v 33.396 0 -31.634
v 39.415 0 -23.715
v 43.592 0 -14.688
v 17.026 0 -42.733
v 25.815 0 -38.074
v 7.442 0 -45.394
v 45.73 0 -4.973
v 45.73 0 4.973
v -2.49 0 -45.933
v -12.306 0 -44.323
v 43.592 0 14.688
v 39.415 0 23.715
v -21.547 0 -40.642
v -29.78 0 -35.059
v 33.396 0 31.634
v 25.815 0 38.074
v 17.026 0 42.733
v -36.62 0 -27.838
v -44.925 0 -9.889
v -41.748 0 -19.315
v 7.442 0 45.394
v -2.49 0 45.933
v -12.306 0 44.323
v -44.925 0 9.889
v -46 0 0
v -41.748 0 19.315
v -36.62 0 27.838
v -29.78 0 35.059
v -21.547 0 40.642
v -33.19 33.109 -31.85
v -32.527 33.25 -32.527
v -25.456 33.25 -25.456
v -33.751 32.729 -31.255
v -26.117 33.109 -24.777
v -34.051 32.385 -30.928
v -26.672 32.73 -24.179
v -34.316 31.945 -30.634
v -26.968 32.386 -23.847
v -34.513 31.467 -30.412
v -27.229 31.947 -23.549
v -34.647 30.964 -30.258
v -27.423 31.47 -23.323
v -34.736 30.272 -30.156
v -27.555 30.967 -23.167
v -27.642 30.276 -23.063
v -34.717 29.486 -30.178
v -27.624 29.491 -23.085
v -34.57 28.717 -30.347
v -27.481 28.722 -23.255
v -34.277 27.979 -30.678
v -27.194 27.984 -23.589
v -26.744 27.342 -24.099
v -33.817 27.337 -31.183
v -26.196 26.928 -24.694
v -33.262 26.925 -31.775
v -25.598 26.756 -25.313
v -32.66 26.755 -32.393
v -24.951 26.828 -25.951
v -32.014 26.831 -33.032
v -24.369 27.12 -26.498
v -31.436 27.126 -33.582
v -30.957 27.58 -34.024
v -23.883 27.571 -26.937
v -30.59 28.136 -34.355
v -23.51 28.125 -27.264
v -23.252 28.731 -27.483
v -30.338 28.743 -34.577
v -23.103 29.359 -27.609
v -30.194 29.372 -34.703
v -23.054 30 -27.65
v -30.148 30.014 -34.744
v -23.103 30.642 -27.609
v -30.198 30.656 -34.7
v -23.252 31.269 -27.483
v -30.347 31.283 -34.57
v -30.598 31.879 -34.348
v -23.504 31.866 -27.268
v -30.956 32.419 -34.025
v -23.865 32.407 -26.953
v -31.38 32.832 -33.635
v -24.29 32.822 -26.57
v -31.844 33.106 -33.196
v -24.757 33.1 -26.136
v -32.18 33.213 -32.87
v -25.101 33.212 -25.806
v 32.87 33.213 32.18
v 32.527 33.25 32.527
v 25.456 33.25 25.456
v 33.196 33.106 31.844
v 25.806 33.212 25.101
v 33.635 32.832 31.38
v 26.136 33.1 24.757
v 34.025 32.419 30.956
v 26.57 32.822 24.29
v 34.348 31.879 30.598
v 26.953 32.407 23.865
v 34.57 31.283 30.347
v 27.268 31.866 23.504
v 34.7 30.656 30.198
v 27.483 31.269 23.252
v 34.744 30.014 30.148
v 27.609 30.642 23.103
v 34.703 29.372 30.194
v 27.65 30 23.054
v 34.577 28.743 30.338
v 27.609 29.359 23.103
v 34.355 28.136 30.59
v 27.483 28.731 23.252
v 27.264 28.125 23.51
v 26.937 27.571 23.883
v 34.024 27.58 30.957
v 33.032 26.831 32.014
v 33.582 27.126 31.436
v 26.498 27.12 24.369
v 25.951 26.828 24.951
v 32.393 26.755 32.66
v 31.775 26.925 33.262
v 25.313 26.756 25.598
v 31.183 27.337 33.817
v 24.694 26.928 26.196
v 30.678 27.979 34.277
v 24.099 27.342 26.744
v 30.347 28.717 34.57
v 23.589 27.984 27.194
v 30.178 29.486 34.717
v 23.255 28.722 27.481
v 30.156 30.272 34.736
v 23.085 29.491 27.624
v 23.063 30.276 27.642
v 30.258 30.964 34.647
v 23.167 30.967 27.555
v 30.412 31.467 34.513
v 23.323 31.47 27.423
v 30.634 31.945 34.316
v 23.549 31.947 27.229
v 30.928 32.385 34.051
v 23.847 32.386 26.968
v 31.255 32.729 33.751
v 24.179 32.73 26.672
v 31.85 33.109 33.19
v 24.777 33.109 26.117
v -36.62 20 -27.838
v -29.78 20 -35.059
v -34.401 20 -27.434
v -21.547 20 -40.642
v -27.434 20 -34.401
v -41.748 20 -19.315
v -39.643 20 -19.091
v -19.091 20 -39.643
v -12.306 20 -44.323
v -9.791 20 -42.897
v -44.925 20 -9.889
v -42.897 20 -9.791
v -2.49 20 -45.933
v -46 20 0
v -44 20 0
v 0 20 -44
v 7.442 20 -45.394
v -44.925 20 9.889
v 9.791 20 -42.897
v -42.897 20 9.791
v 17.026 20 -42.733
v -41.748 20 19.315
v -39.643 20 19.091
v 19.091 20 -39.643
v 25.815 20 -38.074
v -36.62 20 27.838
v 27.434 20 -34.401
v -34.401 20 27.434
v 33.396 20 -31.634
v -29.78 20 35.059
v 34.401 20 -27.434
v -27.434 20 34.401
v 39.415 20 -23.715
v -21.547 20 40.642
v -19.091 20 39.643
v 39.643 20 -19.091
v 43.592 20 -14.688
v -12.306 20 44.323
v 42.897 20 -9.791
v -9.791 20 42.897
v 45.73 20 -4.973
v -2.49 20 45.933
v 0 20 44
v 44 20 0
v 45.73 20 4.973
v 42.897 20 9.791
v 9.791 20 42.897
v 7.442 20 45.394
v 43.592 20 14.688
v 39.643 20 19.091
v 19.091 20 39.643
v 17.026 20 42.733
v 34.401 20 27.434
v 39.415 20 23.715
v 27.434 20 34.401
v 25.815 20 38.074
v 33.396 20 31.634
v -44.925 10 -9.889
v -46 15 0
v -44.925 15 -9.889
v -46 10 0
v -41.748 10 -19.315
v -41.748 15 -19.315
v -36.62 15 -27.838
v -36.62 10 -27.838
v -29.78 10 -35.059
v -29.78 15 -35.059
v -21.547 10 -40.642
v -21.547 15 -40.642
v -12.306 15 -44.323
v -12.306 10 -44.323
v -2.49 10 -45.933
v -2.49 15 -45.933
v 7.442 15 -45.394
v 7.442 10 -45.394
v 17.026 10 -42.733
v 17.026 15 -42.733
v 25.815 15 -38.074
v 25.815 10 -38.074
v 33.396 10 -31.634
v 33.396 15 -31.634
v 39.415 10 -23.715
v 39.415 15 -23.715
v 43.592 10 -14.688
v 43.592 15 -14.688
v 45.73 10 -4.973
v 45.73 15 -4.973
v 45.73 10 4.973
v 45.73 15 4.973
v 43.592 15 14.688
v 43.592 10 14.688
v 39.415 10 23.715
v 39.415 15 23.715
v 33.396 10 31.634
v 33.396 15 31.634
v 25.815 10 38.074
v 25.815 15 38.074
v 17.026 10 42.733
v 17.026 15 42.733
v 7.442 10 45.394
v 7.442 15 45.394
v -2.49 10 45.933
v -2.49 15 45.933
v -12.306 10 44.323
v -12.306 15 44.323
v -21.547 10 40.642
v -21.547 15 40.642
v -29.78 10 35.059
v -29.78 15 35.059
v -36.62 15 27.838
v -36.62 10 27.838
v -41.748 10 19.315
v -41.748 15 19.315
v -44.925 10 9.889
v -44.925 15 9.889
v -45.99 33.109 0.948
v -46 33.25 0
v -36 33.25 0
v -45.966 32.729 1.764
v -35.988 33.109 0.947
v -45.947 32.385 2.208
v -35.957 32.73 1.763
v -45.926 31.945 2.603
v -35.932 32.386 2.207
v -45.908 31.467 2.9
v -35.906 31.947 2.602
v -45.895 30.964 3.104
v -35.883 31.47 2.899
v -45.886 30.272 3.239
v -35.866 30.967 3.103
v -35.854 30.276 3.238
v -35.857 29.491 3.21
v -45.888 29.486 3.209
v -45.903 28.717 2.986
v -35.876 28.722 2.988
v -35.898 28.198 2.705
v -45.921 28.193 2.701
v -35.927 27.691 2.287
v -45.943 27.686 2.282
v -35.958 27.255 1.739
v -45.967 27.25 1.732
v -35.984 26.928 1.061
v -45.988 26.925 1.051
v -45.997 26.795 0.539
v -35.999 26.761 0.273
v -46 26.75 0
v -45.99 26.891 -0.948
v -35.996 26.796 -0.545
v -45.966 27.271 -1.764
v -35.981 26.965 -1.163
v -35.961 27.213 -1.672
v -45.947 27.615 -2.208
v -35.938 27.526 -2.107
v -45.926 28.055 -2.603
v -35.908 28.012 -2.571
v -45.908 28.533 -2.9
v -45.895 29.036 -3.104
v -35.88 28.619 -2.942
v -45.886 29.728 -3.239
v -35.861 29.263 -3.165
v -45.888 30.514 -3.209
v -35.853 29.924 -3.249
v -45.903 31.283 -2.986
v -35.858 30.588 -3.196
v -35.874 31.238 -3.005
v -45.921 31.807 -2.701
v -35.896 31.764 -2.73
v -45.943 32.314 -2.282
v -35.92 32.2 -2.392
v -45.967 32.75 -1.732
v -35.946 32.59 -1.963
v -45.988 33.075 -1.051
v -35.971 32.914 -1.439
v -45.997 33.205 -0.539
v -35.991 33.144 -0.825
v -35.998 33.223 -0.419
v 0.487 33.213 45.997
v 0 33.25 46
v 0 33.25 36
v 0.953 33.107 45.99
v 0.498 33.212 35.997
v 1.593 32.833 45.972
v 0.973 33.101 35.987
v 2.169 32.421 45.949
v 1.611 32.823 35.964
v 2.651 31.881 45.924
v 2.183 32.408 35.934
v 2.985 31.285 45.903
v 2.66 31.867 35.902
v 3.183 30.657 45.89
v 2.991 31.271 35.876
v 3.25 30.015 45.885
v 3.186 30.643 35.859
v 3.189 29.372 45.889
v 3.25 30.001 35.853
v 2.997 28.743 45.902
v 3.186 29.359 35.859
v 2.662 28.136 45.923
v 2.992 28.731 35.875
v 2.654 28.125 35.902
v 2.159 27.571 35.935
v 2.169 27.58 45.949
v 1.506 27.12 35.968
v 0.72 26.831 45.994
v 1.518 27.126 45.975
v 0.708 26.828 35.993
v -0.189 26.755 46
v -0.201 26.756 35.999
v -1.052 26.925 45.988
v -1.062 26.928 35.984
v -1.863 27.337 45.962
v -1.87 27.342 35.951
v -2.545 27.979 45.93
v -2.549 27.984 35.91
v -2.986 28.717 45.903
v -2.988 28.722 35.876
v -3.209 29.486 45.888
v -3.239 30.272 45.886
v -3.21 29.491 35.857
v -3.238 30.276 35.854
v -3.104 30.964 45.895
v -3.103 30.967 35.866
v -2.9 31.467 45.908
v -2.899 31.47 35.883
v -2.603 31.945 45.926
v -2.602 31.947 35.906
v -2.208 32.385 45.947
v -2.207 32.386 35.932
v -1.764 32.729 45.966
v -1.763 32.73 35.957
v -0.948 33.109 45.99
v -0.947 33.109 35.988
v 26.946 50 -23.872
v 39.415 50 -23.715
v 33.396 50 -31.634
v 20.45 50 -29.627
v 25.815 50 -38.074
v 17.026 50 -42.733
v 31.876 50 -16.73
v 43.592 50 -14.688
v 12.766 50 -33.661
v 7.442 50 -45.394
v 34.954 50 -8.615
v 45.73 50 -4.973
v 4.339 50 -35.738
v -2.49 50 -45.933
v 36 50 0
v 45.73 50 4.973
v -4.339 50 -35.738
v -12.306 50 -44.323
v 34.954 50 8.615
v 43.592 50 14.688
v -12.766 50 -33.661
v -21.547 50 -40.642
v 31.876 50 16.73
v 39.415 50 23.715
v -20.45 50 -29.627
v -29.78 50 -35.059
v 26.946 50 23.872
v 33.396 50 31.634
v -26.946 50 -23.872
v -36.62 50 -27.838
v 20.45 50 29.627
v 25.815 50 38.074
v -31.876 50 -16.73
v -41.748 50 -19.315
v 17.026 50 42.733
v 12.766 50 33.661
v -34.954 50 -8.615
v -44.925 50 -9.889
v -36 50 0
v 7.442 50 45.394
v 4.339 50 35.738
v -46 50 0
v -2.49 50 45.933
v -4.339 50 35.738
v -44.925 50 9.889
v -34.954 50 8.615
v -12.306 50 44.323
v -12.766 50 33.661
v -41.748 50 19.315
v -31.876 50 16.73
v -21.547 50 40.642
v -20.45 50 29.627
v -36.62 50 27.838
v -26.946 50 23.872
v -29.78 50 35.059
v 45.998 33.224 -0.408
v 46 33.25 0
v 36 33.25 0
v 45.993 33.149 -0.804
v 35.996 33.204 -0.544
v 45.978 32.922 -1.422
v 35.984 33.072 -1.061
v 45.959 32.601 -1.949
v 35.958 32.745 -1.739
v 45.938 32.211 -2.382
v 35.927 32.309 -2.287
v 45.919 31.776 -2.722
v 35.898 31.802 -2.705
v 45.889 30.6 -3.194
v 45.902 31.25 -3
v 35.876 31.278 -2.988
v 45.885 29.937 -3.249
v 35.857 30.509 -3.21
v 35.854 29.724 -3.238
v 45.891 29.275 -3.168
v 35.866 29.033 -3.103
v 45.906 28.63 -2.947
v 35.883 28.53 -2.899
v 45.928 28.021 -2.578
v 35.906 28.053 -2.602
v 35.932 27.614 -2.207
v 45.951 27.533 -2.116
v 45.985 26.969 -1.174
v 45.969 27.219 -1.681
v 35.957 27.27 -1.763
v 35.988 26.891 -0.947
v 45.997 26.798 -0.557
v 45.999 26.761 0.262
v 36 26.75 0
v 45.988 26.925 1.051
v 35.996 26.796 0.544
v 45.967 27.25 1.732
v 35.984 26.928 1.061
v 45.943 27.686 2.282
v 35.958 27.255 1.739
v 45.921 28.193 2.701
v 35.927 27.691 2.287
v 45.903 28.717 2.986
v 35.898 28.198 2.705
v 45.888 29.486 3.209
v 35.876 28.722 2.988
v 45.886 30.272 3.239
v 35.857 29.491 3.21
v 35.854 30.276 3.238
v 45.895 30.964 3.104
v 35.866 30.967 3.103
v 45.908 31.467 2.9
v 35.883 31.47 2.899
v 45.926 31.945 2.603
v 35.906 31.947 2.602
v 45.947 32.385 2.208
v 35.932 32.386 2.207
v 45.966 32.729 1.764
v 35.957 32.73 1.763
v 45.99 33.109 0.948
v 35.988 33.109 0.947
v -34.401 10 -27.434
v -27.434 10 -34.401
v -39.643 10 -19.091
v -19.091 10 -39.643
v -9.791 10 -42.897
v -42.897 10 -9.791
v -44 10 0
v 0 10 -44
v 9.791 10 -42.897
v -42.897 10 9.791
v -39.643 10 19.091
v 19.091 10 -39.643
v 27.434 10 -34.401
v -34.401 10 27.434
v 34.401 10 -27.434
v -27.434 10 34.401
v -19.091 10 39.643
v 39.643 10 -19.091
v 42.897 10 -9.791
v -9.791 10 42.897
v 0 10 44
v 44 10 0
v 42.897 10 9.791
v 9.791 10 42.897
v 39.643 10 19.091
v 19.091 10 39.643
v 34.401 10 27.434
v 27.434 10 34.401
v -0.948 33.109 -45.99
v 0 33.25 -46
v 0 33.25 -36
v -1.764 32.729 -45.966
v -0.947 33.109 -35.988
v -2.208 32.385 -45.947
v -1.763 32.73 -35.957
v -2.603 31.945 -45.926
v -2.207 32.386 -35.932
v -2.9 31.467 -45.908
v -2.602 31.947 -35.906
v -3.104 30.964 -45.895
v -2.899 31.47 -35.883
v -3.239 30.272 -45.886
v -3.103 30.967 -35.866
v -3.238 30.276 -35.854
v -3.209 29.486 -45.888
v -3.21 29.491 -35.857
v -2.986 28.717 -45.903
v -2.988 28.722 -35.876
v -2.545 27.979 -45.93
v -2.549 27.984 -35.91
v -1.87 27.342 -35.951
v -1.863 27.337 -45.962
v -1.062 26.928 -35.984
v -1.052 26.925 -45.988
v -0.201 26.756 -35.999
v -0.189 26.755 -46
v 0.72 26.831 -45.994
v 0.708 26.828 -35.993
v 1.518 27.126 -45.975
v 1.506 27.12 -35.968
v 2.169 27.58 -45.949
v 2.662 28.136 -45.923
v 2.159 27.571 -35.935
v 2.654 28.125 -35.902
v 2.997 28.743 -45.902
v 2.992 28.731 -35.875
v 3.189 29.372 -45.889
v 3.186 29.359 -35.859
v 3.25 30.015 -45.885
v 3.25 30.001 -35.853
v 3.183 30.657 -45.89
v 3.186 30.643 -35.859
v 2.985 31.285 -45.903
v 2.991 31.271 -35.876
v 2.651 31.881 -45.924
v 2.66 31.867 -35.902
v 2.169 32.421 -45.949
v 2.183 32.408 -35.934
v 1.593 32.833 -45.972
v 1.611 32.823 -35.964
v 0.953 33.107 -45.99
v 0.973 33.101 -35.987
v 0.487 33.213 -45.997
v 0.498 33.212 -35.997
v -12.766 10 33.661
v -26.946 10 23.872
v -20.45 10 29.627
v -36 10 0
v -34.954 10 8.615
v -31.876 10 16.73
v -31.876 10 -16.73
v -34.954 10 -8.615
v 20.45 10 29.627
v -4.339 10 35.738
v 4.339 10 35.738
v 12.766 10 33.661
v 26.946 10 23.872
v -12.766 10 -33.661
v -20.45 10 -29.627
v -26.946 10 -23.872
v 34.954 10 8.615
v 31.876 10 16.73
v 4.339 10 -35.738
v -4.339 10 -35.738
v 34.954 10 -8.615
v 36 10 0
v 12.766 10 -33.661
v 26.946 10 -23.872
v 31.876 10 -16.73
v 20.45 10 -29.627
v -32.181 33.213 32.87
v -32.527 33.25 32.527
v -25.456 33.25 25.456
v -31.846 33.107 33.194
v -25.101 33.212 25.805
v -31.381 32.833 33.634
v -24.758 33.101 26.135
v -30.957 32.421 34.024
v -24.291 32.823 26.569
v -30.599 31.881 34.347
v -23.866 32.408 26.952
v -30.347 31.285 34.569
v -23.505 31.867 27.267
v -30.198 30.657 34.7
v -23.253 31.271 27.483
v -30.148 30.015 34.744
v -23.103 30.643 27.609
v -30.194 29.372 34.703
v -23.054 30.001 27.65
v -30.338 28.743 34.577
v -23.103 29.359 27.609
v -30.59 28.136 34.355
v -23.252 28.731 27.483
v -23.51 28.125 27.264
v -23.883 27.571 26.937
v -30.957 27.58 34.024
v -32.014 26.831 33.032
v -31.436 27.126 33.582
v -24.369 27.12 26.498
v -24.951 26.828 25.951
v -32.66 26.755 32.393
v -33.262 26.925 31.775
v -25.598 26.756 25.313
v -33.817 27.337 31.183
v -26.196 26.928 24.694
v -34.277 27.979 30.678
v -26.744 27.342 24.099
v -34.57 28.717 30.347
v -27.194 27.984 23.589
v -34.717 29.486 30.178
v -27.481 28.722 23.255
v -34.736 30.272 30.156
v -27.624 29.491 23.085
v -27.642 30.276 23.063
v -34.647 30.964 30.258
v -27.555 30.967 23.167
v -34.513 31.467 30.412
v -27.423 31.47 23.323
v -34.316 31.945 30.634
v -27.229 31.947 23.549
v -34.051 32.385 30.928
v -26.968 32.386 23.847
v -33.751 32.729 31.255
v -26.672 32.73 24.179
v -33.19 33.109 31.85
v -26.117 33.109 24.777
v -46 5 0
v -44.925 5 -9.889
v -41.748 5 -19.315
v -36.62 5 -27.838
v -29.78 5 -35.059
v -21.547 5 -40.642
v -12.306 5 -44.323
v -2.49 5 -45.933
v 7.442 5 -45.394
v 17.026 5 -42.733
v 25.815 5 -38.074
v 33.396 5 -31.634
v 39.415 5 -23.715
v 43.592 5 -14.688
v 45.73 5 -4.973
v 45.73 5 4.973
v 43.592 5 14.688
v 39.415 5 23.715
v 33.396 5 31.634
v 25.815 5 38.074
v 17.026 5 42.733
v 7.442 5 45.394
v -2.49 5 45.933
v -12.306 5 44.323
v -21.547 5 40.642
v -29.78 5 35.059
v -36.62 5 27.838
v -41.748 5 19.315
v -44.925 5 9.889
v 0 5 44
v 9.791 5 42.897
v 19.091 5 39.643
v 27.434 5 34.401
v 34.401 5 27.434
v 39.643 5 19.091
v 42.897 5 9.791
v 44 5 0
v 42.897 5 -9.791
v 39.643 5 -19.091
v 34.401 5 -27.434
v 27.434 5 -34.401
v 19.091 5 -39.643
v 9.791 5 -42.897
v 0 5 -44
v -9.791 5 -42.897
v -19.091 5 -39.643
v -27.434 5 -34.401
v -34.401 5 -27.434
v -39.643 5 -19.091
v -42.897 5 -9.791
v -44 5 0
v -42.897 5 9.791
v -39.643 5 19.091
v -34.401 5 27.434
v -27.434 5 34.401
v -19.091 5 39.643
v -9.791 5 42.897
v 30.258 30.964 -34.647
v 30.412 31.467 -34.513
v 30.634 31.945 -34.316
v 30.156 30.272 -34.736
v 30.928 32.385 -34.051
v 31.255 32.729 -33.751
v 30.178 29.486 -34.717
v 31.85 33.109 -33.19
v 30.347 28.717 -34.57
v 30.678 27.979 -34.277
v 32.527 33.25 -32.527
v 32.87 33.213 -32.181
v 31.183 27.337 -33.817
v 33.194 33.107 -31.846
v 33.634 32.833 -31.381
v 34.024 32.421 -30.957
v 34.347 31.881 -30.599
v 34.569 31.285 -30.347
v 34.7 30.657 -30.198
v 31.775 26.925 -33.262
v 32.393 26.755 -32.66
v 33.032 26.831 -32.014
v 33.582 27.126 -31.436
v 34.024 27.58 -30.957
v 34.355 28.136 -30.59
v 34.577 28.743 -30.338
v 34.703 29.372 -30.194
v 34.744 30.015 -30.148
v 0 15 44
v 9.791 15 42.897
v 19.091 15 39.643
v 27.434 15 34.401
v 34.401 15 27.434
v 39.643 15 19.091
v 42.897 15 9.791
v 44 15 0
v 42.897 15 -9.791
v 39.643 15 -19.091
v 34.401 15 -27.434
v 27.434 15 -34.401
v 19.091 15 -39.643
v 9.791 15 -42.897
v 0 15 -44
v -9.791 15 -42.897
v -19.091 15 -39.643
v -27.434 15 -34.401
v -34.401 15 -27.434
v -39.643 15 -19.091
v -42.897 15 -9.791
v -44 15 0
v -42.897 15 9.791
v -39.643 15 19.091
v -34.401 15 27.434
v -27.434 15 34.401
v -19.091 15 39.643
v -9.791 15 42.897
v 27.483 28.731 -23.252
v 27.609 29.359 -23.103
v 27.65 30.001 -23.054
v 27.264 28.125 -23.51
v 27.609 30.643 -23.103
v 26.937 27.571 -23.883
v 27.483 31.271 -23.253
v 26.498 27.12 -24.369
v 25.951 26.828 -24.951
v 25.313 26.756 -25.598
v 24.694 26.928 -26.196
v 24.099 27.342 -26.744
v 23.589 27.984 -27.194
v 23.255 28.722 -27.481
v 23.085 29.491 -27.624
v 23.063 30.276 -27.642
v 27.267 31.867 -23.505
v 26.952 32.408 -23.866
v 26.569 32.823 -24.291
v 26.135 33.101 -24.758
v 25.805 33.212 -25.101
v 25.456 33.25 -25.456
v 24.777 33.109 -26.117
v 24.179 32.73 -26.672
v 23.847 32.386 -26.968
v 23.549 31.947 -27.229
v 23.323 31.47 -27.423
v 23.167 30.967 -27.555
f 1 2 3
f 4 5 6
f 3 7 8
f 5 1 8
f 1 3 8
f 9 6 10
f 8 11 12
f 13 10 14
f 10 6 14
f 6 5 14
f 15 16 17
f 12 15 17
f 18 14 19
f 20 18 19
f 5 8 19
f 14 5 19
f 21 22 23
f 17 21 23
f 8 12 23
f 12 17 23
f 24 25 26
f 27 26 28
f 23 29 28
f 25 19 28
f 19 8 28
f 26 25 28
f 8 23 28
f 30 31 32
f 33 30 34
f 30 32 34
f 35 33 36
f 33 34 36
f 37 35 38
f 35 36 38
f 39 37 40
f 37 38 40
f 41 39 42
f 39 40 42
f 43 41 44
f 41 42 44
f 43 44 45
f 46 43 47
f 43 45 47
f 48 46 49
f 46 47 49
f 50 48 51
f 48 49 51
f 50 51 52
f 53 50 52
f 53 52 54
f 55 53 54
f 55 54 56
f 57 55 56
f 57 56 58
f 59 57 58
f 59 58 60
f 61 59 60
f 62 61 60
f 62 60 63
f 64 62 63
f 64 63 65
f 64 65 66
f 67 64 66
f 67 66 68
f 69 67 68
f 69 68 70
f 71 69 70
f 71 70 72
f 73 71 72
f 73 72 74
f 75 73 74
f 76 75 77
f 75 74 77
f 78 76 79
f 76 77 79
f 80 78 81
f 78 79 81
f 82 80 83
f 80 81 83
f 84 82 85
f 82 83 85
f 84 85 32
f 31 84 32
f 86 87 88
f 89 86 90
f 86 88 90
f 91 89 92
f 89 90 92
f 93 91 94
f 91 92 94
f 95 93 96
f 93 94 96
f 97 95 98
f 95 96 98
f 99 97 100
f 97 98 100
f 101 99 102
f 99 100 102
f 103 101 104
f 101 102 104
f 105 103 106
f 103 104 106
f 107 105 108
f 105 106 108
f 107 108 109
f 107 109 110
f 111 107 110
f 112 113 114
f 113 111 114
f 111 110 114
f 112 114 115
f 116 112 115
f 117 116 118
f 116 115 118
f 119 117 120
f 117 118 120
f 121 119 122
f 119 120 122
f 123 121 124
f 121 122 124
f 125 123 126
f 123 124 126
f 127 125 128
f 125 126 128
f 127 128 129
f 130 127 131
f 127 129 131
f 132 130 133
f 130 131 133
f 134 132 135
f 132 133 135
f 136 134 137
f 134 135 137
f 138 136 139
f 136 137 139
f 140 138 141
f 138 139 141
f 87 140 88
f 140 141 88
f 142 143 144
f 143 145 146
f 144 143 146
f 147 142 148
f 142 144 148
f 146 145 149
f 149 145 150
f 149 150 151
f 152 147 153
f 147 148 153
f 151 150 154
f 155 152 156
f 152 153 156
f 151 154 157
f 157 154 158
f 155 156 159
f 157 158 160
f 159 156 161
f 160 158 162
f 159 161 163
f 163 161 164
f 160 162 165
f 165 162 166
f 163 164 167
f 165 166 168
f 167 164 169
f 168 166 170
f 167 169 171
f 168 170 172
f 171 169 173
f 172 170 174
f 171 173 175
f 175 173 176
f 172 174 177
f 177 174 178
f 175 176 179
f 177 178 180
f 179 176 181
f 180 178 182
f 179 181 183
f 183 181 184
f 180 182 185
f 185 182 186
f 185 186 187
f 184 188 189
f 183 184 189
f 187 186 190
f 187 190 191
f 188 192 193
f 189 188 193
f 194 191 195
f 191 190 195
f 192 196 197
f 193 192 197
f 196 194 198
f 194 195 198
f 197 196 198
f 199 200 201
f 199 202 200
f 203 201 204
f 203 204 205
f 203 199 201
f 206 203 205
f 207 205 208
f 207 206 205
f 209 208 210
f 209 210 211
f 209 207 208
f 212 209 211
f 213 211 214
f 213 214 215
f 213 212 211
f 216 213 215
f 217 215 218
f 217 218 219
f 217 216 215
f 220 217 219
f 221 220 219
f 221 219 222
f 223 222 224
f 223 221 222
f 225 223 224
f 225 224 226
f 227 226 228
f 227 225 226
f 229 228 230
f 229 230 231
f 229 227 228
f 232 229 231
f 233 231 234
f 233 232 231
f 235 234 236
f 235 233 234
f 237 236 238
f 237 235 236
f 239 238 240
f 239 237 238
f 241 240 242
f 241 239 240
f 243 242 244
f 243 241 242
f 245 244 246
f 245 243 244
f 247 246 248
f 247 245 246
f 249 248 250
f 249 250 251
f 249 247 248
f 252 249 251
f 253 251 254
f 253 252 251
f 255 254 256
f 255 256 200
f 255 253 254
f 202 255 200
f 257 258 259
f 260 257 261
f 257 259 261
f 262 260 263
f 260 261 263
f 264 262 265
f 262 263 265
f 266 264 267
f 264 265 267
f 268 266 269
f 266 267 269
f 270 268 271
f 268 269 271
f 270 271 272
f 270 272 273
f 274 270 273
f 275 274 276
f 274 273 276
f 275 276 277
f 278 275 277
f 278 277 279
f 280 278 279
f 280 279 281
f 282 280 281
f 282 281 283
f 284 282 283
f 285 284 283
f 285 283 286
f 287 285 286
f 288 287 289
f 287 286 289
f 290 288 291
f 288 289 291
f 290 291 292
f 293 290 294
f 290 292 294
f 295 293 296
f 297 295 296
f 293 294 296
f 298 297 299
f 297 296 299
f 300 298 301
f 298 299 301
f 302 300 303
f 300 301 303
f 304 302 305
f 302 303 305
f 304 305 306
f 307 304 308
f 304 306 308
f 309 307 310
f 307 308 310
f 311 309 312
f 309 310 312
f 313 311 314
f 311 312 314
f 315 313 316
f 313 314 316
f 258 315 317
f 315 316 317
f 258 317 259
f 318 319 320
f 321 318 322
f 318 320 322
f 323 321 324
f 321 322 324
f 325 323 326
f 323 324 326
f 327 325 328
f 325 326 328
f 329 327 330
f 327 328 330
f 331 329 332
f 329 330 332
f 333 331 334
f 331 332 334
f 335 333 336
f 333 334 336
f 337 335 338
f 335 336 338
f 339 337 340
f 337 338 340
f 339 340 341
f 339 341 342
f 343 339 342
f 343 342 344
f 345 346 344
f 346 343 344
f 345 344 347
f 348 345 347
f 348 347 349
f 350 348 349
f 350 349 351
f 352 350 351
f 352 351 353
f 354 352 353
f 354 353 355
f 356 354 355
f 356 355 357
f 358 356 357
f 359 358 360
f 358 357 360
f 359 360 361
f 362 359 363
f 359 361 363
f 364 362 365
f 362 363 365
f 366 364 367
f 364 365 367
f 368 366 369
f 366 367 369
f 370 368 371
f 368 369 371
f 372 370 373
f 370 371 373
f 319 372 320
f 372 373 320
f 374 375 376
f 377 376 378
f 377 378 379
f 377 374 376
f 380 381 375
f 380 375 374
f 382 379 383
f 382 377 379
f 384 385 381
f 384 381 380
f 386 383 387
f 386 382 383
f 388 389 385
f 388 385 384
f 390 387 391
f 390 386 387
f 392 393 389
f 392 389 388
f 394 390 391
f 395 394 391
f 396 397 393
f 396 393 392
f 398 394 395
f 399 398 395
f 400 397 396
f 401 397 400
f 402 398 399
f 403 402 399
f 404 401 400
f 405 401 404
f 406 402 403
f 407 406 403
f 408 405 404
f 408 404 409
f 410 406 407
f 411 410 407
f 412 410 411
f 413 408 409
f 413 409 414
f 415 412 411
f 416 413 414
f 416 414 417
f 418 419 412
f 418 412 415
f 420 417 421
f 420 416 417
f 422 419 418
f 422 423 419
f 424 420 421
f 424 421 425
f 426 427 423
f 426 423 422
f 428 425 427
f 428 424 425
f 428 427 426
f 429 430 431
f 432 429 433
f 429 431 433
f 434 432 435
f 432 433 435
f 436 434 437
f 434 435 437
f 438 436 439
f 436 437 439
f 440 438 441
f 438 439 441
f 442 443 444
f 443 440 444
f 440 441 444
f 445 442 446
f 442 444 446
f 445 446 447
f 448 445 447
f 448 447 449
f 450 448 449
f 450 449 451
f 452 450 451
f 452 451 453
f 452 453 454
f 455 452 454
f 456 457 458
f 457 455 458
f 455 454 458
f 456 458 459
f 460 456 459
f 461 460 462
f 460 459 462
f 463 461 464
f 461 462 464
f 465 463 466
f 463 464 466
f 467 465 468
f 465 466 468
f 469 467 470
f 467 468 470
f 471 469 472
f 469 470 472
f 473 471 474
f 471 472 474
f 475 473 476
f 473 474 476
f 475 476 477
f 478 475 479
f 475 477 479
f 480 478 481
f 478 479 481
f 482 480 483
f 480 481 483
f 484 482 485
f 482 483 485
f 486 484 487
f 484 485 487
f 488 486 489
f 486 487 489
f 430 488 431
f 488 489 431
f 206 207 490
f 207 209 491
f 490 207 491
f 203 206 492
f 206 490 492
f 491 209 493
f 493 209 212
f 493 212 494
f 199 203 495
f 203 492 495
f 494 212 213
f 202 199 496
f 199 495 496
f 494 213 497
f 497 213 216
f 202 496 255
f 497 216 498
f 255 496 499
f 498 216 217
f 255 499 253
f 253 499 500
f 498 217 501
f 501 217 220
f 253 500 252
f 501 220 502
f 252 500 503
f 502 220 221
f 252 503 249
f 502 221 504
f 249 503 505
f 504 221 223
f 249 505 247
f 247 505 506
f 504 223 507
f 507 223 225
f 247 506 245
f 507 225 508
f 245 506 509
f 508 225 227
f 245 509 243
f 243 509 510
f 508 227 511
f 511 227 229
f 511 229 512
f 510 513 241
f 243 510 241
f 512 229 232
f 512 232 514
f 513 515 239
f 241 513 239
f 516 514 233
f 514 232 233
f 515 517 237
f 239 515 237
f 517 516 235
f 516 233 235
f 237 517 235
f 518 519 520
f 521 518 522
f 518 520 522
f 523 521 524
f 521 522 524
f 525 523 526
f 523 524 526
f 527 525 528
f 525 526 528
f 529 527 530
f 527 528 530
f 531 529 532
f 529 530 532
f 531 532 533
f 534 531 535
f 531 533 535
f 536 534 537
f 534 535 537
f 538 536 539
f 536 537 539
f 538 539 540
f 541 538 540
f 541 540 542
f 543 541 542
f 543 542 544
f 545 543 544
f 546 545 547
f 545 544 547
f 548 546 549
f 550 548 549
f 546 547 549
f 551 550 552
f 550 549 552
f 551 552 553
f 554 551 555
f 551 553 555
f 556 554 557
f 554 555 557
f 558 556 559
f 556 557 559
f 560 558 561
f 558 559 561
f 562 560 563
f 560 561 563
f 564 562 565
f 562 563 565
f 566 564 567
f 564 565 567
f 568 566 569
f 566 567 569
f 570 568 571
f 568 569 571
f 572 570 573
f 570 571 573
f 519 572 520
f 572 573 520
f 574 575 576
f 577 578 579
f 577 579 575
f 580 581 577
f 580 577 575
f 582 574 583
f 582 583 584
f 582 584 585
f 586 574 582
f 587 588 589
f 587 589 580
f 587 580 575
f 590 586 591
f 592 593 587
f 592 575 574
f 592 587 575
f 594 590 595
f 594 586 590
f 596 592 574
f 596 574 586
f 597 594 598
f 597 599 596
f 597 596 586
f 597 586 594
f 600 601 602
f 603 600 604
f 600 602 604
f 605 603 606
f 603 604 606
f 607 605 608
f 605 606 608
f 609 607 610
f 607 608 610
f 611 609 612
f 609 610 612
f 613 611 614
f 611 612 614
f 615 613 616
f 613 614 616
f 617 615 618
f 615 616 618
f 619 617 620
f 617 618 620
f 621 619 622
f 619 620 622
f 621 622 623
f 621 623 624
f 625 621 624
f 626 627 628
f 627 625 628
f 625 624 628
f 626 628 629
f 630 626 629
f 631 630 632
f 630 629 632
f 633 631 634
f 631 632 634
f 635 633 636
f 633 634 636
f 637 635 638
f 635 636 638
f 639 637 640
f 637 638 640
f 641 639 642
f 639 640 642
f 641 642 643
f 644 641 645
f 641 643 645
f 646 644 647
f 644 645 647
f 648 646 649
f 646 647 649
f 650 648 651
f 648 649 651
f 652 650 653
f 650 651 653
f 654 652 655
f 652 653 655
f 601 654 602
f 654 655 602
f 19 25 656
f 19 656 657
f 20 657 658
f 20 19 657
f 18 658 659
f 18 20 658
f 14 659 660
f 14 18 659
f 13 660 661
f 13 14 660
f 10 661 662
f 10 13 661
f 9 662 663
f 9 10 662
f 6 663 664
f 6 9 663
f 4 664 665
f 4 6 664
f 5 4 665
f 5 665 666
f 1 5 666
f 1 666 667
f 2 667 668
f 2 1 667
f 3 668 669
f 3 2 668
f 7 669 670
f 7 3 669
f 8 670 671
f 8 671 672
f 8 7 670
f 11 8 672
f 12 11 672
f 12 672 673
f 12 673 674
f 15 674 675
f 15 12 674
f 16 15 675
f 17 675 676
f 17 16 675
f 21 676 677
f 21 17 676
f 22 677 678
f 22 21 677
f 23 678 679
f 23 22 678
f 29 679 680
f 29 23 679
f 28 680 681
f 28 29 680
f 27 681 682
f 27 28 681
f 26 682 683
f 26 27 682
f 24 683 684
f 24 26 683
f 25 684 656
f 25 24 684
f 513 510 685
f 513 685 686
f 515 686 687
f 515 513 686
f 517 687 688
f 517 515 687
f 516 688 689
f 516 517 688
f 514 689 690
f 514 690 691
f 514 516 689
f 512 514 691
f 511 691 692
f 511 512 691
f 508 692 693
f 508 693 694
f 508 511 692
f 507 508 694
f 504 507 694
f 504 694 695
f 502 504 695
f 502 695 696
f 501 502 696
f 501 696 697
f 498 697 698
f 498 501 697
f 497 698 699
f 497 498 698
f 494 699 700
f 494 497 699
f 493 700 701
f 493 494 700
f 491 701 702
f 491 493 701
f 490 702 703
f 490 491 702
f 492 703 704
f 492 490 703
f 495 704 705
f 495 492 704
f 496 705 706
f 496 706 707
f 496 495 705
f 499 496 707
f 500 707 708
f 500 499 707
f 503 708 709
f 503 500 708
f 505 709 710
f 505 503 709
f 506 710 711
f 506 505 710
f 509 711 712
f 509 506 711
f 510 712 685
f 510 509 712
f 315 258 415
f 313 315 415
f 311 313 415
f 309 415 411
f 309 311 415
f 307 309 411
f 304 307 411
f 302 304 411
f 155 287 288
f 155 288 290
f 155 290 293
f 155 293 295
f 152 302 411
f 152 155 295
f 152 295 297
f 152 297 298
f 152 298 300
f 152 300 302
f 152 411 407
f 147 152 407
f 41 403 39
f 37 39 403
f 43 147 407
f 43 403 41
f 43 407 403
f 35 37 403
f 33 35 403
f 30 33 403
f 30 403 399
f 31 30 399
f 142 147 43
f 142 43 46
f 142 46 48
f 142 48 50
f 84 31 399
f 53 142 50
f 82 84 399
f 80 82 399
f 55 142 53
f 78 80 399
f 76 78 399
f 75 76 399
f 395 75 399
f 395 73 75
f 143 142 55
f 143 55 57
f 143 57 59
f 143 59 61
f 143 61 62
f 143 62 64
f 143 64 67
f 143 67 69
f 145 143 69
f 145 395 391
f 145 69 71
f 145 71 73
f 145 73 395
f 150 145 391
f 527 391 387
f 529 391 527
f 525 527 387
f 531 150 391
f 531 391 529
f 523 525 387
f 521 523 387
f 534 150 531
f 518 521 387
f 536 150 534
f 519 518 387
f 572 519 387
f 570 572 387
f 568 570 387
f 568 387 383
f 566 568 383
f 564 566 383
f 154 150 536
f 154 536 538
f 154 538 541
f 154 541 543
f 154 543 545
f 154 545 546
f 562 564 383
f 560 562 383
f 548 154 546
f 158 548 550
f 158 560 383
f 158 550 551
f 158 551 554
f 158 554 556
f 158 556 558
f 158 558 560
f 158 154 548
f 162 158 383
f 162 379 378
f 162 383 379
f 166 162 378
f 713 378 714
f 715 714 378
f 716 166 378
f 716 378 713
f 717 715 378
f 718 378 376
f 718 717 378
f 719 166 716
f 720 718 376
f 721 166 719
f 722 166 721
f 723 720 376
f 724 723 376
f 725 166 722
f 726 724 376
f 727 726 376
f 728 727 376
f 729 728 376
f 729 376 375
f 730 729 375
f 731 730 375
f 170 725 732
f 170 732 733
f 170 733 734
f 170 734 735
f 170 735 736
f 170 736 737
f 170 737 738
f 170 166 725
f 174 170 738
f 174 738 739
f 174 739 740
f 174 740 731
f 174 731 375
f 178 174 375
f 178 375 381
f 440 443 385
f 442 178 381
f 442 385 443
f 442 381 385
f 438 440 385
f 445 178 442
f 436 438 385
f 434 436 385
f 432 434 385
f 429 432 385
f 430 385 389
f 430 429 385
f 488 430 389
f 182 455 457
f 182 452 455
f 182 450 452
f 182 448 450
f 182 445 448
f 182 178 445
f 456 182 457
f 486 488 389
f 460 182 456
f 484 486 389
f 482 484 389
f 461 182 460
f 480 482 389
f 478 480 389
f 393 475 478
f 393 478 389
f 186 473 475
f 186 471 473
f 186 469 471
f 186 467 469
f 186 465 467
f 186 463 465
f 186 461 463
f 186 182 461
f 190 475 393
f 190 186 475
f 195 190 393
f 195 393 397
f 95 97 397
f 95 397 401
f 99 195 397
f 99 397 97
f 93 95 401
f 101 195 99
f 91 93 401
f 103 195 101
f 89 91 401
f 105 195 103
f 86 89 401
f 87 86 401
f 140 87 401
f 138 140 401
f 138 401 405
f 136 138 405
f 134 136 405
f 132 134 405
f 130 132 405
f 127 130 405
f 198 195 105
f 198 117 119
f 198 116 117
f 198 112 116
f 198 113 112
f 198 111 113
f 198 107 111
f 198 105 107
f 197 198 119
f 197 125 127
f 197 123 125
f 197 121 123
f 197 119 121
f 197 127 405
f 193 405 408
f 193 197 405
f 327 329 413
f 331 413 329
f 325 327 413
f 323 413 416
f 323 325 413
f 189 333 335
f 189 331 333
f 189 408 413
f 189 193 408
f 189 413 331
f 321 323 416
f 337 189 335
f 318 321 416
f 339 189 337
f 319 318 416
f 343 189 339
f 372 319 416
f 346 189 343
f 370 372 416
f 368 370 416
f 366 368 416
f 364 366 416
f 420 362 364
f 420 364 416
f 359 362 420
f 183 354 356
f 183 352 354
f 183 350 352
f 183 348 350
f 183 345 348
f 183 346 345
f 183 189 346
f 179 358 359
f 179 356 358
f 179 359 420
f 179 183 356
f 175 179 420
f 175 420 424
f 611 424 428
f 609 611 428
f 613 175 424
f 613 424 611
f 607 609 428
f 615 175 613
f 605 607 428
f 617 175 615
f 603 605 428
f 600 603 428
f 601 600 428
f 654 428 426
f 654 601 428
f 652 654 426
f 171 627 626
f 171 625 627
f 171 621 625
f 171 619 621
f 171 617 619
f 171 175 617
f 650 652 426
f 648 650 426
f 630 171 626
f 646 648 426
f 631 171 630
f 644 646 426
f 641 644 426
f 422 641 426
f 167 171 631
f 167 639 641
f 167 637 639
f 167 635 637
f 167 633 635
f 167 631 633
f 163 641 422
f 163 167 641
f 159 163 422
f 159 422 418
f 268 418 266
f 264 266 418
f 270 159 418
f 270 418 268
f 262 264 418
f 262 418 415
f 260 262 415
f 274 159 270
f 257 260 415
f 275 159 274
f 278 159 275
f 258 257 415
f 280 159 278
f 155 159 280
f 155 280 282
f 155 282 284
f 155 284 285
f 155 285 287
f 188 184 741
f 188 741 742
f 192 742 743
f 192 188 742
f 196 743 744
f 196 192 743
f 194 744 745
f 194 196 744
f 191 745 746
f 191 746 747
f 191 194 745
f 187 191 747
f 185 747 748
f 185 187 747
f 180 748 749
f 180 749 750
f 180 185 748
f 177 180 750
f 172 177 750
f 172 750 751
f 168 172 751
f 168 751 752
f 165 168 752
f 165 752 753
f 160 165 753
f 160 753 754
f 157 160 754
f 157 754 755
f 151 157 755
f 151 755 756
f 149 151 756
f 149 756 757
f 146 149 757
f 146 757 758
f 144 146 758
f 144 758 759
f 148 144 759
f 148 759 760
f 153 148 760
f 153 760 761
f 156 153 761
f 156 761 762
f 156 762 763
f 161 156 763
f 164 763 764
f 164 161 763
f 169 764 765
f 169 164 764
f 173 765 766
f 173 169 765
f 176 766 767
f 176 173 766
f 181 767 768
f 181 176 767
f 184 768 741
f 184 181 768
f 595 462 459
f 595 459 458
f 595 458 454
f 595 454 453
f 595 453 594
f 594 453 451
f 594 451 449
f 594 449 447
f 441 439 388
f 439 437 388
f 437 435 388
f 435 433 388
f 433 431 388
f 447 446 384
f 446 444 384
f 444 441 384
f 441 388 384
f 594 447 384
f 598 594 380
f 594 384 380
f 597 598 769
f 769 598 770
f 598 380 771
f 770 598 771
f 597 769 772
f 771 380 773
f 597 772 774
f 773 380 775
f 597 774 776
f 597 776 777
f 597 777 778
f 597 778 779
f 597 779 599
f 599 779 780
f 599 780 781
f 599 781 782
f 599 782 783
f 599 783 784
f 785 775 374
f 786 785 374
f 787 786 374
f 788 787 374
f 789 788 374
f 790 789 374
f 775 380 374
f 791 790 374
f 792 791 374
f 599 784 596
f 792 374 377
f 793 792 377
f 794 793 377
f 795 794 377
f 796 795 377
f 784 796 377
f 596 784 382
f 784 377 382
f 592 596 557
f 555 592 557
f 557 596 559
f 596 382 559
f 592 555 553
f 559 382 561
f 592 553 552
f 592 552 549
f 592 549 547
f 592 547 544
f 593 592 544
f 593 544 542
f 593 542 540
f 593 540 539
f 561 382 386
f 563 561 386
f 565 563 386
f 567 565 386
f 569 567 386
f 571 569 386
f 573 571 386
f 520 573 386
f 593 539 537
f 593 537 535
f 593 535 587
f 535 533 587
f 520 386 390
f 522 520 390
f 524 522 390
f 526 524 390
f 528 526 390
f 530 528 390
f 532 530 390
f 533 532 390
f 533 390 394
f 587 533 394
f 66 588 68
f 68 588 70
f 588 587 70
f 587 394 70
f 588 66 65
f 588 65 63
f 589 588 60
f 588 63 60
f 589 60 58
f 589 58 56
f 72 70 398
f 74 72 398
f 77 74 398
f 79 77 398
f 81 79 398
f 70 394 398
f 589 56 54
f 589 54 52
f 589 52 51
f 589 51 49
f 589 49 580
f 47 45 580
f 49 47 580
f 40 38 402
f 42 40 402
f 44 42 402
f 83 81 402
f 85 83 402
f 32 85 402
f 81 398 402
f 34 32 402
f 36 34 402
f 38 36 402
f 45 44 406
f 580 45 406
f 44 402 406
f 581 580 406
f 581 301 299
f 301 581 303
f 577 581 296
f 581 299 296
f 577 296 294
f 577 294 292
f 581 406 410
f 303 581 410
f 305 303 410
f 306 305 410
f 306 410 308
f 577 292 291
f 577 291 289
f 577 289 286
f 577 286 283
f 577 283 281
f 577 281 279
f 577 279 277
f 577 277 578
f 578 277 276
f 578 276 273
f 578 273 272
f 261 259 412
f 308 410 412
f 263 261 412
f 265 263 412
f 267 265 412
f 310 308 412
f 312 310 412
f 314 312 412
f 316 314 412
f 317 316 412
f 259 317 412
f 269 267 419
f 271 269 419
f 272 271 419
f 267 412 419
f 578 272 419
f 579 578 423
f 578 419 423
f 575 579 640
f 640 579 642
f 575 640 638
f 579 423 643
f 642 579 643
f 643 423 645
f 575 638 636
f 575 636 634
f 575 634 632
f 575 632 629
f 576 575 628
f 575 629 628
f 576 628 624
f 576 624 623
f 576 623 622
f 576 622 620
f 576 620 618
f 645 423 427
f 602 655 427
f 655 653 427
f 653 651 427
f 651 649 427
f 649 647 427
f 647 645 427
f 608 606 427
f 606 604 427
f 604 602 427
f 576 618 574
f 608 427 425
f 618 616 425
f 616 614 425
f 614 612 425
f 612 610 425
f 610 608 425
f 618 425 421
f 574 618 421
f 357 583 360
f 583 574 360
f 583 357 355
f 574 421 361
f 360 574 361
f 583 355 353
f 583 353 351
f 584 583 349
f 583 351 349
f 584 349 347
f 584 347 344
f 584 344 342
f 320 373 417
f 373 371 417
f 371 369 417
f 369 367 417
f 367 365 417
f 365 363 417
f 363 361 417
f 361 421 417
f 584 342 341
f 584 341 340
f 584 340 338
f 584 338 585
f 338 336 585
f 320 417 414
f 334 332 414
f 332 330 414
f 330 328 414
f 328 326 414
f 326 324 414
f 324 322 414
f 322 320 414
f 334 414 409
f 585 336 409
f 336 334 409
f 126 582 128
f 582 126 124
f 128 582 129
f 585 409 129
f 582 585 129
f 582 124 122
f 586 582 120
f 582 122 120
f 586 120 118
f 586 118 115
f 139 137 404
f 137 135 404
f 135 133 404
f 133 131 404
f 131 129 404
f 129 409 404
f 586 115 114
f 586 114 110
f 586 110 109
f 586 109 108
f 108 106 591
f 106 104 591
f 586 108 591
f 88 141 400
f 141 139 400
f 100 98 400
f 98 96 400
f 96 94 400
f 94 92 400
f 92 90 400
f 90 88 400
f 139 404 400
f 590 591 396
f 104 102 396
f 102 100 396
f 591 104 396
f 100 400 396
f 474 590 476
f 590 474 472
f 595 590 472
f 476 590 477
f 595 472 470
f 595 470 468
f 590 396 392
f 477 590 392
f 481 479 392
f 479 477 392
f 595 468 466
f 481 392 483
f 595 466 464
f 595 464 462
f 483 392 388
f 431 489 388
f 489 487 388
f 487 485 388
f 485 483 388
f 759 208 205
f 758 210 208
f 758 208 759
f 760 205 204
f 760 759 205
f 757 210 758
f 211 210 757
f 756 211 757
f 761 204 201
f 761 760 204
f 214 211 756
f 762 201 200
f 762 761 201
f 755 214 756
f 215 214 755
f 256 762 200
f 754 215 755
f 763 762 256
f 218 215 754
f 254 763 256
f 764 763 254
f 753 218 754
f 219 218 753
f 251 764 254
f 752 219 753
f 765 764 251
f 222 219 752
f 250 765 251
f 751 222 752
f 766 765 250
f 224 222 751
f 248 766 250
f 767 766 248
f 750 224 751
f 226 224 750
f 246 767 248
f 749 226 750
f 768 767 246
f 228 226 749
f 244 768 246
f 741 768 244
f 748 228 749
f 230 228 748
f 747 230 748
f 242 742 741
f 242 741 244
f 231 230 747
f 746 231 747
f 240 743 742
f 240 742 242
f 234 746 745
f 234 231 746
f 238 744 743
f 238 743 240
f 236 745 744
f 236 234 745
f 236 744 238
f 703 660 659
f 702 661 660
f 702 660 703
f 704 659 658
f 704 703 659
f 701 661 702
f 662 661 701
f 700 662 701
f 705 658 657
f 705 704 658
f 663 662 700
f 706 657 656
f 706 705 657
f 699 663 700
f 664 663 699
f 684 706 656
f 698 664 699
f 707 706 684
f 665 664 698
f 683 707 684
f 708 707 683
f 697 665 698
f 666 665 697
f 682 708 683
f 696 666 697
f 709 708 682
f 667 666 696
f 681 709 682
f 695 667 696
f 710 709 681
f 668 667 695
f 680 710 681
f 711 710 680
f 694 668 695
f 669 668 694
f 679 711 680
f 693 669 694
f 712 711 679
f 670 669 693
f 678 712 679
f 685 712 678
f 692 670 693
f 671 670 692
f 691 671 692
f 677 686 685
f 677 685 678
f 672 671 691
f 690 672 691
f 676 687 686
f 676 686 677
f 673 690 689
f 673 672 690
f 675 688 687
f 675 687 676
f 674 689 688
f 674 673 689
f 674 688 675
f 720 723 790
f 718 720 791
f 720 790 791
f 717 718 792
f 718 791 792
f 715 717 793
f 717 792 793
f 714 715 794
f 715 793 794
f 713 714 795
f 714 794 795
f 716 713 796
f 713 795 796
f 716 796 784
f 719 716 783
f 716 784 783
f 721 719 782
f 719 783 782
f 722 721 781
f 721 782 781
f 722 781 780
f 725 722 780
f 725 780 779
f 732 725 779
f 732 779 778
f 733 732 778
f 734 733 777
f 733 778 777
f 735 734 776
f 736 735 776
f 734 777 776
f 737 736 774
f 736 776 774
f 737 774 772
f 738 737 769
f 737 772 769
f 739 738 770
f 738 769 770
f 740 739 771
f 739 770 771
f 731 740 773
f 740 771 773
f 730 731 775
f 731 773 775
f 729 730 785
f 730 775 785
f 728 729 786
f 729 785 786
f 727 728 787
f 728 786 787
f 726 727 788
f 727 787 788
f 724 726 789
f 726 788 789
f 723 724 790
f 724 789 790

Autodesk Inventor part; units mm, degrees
ref_plane "YZ Plane" through (0, 0, 0) normal (1, 0, 0) x (0, 1, 0)
ref_plane "XZ Plane" through (0, 0, 0) normal (0, 1, 0) x (-1, 0, 0)
sketch "Sketch1" plane through (0, 0, 0) normal (0, 1, 0) x (-1, 0, 0)
  circle A0 centre (0, 0) radius 46
  dimension "d0" = 92
extrude "Extrusion1" add sketch "Sketch1" along normal blind 50
ref_plane "Work Plane1" through (0, 50, 0) normal (0, 1, 0) x (1, 0, 0)
sketch "Sketch2" plane through (0, 50, 0) normal (0, 1, 0) x (1, 0, 0)
  circle A0 centre (0, 0) radius 36
  dimension "d4" = 72
extrude "Extrusion2" cut sketch "Sketch2" against normal blind 40
sketch "Sketch3" plane through (0, 0, 0) normal (1, 0, 0) x (0, 1, 0)
  line L0 (50, -46) -> (0, -46) projected
  line L1 (0, -46) -> (0, 46) projected
  line L2 (0, 46) -> (50, 46) projected
  line L3 (50, 46) -> (50, 36) projected
  line L4 (50, 36) -> (10, 36) projected
  line L5 (10, 36) -> (10, -36) projected
  line L6 (10, -36) -> (50, -36) projected
  line L7 (50, -36) -> (50, -46) projected
  line L8 (0, 46) -> (50, 46) projected
  line L9 (10, 46) -> (5, 46)
  line L10 (5, 46) -> (5, 44)
  line L11 (5, 44) -> (10, 44)
  line L12 (10, 44) -> (10, 46)
  line L13 (20, 46) -> (15, 46)
  line L14 (15, 46) -> (15, 44)
  line L15 (15, 44) -> (20, 44)
  line L16 (20, 44) -> (20, 46)
  line L17 (-10, 0) -> (60, 0) projected
  point P0 (0, 0)
  point P1 (15, 46)
  dimension "d7" = 5
  dimension "d8" = 5
  dimension "d9" = 5
  dimension "d10" = 5
  dimension "d11" = 2
revolve "Revolution1" cut sketch "Sketch3" angle 360 about axis through (0, -10, 0) along (0, 1, 0) contours L2 L12 L11 L10 | L2 L16 L15 L14
sketch "Sketch4" plane through (0, 0, 0) normal (1, 0, 0) x (0, 1, 0)
  line L0 (10, -36) -> (50, -36) projected
  line L1 (50, -36) -> (50, -46) projected
  line L2 (50, -46) -> (20, -46) projected
  line L3 (20, -46) -> (20, -44) projected
  line L4 (20, -44) -> (15, -44) projected
  line L5 (15, -44) -> (15, -46) projected
  line L6 (15, -46) -> (10, -46) projected
  line L7 (10, -46) -> (10, -44) projected
  line L8 (10, -44) -> (5, -44) projected
  line L9 (5, -44) -> (5, -46) projected
  line L10 (5, -46) -> (0, -46) projected
  line L11 (0, -46) -> (0, 46) projected
  line L12 (0, 46) -> (5, 46) projected
  line L13 (5, 46) -> (5, 44) projected
  line L14 (5, 44) -> (10, 44) projected
  line L15 (10, 44) -> (10, 46) projected
  line L16 (10, 46) -> (15, 46) projected
  line L17 (15, 46) -> (15, 44) projected
  line L18 (15, 44) -> (20, 44) projected
  line L19 (20, 44) -> (20, 46) projected
  line L20 (20, 46) -> (50, 46) projected
  line L21 (50, 46) -> (50, 36) projected
  line L22 (50, 36) -> (10, 36) projected
  line L23 (10, 36) -> (10, -36) projected
  line L24 (10, -36) -> (50, -36) projected
  line L25 (50, -36) -> (50, -46) projected
  line L26 (50, 46) -> (50, 36) projected
  line L27 (50, 36) -> (10, 36) projected
  line L28 (10, 36) -> (10, -36) projected
  line L29 (20, -46) -> (20, 46) projected
  line L30 (50, -46) -> (50, 46) projected
  circle A0 centre (30, 0) radius 3.25
  line L31 (50, -46) -> (20, -46) projected
  line L32 (20, -46) -> (20, -44) projected
  line L33 (20, -44) -> (15, -44) projected
  line L34 (15, -44) -> (15, -46) projected
  line L35 (15, -46) -> (10, -46) projected
  line L36 (10, -46) -> (10, -44) projected
  line L37 (10, -44) -> (5, -44) projected
  line L38 (5, -44) -> (5, -46) projected
  line L39 (5, -46) -> (0, -46) projected
  line L40 (0, -46) -> (0, 46) projected
  line L41 (0, 46) -> (5, 46) projected
  line L42 (5, 46) -> (5, 44) projected
  line L43 (5, 44) -> (10, 44) projected
  line L44 (10, 44) -> (10, 46) projected
  line L45 (10, 46) -> (15, 46) projected
  line L46 (15, 46) -> (15, 44) projected
  line L47 (15, 44) -> (20, 44) projected
  line L48 (20, 44) -> (20, 46) projected
  line L49 (20, 46) -> (50, 46) projected
  point P0 (0, 0)
  dimension "d17" = 6.5
  dimension "d18" = 20
extrude "Extrusion3" cut sketch "Sketch4" along normal through all both and the other way through all contours A0
pattern_circular "Circular Pattern1" count 8 over 360 about axis through (0, 50, 0) along (0, -1, 0) of "Extrusion3"
properties part number "bulk head 94mm"
